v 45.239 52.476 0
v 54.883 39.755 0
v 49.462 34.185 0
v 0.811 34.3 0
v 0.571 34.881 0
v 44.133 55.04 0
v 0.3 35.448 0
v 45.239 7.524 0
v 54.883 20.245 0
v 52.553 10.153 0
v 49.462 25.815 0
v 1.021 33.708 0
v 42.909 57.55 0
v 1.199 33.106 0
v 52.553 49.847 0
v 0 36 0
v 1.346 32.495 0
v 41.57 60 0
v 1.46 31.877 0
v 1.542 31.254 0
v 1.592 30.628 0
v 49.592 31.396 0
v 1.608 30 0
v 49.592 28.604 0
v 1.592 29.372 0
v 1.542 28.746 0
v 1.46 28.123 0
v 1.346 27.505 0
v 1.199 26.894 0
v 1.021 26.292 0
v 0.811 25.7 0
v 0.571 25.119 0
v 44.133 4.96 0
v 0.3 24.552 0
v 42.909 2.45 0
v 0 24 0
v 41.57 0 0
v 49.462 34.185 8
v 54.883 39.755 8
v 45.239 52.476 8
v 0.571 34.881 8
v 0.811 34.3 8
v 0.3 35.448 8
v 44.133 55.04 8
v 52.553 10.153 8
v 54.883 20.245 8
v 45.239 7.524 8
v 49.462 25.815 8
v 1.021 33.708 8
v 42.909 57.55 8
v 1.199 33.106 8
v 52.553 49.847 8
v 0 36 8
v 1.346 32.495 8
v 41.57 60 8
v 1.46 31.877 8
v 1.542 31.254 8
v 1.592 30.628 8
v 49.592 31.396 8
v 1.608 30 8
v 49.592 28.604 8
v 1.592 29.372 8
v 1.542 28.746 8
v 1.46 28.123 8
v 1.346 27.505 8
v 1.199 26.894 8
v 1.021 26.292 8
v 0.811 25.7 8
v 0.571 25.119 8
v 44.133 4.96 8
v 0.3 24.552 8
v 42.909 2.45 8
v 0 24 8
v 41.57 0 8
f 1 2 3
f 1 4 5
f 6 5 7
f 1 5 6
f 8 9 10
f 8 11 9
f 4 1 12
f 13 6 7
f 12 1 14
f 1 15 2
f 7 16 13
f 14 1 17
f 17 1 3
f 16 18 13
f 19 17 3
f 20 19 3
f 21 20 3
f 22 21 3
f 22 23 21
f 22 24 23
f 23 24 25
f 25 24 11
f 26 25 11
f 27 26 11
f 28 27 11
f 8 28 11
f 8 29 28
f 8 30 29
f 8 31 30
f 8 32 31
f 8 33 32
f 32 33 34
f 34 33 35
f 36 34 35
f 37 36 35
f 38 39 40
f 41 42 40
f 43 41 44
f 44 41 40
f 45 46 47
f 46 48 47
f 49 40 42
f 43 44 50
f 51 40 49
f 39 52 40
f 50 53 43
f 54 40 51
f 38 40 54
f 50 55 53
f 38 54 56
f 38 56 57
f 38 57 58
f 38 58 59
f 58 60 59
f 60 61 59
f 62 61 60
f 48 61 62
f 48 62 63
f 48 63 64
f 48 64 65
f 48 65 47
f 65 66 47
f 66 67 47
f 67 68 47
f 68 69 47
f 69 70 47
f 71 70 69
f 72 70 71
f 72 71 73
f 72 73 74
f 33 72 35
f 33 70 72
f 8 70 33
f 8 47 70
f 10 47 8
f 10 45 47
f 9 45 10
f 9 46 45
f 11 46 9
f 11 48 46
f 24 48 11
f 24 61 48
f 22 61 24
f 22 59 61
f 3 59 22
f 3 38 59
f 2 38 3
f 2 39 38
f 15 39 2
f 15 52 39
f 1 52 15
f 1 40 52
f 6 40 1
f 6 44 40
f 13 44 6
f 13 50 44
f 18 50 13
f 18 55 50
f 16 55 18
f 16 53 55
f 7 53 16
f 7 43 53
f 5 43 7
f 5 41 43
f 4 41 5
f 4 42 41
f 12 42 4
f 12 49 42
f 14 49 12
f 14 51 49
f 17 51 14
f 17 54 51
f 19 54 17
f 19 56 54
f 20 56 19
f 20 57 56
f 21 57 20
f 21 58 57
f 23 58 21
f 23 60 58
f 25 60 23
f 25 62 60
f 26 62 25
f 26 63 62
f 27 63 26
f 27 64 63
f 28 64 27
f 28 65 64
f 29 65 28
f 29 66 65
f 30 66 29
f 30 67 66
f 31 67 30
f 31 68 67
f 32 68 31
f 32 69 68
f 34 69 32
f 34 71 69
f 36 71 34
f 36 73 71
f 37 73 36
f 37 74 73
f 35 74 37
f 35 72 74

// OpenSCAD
$fn = 32;

// ----------------------------------------------------------------------
// Gear sector: 2 teeth on 60 degrees
// ----------------------------------------------------------------------

// --- parameters (mm) ---
sector_angle = 60;        // sector angle, degrees
root_r = 60;              // root circle radius
tooth_h = 6;              // tooth height over the root circle
teeth = 2;                // number of teeth on the sector
hub_r = 12;               // hub bore radius
plate_t = 8;              // sector thickness, Z
arc_step = 3;             // sampling step of the root/hub arcs, degrees

tip_r = root_r + tooth_h;  // tip circle radius

profile = [[41.57, 0], [42.909, 2.45], [44.133, 4.96], [45.239, 7.524], [52.553, 10.153], [54.883, 20.245], [49.462, 25.815], [49.592, 28.604], [49.592, 31.396], [49.462, 34.185], [54.883, 39.755], [52.553, 49.847], [45.239, 52.476], [44.133, 55.04], [42.909, 57.55], [41.57, 60], [0, 36], [0.3, 35.448], [0.571, 34.881], [0.811, 34.3], [1.021, 33.708], [1.199, 33.106], [1.346, 32.495], [1.46, 31.877], [1.542, 31.254], [1.592, 30.628], [1.608, 30], [1.592, 29.372], [1.542, 28.746], [1.46, 28.123], [1.346, 27.505], [1.199, 26.894], [1.021, 26.292], [0.811, 25.7], [0.571, 25.119], [0.3, 24.552], [0, 24]];  // primary outline, 37 points, counter clockwise

// --- the one profile operation ---
linear_extrude(height = plate_t) polygon(points = profile);
